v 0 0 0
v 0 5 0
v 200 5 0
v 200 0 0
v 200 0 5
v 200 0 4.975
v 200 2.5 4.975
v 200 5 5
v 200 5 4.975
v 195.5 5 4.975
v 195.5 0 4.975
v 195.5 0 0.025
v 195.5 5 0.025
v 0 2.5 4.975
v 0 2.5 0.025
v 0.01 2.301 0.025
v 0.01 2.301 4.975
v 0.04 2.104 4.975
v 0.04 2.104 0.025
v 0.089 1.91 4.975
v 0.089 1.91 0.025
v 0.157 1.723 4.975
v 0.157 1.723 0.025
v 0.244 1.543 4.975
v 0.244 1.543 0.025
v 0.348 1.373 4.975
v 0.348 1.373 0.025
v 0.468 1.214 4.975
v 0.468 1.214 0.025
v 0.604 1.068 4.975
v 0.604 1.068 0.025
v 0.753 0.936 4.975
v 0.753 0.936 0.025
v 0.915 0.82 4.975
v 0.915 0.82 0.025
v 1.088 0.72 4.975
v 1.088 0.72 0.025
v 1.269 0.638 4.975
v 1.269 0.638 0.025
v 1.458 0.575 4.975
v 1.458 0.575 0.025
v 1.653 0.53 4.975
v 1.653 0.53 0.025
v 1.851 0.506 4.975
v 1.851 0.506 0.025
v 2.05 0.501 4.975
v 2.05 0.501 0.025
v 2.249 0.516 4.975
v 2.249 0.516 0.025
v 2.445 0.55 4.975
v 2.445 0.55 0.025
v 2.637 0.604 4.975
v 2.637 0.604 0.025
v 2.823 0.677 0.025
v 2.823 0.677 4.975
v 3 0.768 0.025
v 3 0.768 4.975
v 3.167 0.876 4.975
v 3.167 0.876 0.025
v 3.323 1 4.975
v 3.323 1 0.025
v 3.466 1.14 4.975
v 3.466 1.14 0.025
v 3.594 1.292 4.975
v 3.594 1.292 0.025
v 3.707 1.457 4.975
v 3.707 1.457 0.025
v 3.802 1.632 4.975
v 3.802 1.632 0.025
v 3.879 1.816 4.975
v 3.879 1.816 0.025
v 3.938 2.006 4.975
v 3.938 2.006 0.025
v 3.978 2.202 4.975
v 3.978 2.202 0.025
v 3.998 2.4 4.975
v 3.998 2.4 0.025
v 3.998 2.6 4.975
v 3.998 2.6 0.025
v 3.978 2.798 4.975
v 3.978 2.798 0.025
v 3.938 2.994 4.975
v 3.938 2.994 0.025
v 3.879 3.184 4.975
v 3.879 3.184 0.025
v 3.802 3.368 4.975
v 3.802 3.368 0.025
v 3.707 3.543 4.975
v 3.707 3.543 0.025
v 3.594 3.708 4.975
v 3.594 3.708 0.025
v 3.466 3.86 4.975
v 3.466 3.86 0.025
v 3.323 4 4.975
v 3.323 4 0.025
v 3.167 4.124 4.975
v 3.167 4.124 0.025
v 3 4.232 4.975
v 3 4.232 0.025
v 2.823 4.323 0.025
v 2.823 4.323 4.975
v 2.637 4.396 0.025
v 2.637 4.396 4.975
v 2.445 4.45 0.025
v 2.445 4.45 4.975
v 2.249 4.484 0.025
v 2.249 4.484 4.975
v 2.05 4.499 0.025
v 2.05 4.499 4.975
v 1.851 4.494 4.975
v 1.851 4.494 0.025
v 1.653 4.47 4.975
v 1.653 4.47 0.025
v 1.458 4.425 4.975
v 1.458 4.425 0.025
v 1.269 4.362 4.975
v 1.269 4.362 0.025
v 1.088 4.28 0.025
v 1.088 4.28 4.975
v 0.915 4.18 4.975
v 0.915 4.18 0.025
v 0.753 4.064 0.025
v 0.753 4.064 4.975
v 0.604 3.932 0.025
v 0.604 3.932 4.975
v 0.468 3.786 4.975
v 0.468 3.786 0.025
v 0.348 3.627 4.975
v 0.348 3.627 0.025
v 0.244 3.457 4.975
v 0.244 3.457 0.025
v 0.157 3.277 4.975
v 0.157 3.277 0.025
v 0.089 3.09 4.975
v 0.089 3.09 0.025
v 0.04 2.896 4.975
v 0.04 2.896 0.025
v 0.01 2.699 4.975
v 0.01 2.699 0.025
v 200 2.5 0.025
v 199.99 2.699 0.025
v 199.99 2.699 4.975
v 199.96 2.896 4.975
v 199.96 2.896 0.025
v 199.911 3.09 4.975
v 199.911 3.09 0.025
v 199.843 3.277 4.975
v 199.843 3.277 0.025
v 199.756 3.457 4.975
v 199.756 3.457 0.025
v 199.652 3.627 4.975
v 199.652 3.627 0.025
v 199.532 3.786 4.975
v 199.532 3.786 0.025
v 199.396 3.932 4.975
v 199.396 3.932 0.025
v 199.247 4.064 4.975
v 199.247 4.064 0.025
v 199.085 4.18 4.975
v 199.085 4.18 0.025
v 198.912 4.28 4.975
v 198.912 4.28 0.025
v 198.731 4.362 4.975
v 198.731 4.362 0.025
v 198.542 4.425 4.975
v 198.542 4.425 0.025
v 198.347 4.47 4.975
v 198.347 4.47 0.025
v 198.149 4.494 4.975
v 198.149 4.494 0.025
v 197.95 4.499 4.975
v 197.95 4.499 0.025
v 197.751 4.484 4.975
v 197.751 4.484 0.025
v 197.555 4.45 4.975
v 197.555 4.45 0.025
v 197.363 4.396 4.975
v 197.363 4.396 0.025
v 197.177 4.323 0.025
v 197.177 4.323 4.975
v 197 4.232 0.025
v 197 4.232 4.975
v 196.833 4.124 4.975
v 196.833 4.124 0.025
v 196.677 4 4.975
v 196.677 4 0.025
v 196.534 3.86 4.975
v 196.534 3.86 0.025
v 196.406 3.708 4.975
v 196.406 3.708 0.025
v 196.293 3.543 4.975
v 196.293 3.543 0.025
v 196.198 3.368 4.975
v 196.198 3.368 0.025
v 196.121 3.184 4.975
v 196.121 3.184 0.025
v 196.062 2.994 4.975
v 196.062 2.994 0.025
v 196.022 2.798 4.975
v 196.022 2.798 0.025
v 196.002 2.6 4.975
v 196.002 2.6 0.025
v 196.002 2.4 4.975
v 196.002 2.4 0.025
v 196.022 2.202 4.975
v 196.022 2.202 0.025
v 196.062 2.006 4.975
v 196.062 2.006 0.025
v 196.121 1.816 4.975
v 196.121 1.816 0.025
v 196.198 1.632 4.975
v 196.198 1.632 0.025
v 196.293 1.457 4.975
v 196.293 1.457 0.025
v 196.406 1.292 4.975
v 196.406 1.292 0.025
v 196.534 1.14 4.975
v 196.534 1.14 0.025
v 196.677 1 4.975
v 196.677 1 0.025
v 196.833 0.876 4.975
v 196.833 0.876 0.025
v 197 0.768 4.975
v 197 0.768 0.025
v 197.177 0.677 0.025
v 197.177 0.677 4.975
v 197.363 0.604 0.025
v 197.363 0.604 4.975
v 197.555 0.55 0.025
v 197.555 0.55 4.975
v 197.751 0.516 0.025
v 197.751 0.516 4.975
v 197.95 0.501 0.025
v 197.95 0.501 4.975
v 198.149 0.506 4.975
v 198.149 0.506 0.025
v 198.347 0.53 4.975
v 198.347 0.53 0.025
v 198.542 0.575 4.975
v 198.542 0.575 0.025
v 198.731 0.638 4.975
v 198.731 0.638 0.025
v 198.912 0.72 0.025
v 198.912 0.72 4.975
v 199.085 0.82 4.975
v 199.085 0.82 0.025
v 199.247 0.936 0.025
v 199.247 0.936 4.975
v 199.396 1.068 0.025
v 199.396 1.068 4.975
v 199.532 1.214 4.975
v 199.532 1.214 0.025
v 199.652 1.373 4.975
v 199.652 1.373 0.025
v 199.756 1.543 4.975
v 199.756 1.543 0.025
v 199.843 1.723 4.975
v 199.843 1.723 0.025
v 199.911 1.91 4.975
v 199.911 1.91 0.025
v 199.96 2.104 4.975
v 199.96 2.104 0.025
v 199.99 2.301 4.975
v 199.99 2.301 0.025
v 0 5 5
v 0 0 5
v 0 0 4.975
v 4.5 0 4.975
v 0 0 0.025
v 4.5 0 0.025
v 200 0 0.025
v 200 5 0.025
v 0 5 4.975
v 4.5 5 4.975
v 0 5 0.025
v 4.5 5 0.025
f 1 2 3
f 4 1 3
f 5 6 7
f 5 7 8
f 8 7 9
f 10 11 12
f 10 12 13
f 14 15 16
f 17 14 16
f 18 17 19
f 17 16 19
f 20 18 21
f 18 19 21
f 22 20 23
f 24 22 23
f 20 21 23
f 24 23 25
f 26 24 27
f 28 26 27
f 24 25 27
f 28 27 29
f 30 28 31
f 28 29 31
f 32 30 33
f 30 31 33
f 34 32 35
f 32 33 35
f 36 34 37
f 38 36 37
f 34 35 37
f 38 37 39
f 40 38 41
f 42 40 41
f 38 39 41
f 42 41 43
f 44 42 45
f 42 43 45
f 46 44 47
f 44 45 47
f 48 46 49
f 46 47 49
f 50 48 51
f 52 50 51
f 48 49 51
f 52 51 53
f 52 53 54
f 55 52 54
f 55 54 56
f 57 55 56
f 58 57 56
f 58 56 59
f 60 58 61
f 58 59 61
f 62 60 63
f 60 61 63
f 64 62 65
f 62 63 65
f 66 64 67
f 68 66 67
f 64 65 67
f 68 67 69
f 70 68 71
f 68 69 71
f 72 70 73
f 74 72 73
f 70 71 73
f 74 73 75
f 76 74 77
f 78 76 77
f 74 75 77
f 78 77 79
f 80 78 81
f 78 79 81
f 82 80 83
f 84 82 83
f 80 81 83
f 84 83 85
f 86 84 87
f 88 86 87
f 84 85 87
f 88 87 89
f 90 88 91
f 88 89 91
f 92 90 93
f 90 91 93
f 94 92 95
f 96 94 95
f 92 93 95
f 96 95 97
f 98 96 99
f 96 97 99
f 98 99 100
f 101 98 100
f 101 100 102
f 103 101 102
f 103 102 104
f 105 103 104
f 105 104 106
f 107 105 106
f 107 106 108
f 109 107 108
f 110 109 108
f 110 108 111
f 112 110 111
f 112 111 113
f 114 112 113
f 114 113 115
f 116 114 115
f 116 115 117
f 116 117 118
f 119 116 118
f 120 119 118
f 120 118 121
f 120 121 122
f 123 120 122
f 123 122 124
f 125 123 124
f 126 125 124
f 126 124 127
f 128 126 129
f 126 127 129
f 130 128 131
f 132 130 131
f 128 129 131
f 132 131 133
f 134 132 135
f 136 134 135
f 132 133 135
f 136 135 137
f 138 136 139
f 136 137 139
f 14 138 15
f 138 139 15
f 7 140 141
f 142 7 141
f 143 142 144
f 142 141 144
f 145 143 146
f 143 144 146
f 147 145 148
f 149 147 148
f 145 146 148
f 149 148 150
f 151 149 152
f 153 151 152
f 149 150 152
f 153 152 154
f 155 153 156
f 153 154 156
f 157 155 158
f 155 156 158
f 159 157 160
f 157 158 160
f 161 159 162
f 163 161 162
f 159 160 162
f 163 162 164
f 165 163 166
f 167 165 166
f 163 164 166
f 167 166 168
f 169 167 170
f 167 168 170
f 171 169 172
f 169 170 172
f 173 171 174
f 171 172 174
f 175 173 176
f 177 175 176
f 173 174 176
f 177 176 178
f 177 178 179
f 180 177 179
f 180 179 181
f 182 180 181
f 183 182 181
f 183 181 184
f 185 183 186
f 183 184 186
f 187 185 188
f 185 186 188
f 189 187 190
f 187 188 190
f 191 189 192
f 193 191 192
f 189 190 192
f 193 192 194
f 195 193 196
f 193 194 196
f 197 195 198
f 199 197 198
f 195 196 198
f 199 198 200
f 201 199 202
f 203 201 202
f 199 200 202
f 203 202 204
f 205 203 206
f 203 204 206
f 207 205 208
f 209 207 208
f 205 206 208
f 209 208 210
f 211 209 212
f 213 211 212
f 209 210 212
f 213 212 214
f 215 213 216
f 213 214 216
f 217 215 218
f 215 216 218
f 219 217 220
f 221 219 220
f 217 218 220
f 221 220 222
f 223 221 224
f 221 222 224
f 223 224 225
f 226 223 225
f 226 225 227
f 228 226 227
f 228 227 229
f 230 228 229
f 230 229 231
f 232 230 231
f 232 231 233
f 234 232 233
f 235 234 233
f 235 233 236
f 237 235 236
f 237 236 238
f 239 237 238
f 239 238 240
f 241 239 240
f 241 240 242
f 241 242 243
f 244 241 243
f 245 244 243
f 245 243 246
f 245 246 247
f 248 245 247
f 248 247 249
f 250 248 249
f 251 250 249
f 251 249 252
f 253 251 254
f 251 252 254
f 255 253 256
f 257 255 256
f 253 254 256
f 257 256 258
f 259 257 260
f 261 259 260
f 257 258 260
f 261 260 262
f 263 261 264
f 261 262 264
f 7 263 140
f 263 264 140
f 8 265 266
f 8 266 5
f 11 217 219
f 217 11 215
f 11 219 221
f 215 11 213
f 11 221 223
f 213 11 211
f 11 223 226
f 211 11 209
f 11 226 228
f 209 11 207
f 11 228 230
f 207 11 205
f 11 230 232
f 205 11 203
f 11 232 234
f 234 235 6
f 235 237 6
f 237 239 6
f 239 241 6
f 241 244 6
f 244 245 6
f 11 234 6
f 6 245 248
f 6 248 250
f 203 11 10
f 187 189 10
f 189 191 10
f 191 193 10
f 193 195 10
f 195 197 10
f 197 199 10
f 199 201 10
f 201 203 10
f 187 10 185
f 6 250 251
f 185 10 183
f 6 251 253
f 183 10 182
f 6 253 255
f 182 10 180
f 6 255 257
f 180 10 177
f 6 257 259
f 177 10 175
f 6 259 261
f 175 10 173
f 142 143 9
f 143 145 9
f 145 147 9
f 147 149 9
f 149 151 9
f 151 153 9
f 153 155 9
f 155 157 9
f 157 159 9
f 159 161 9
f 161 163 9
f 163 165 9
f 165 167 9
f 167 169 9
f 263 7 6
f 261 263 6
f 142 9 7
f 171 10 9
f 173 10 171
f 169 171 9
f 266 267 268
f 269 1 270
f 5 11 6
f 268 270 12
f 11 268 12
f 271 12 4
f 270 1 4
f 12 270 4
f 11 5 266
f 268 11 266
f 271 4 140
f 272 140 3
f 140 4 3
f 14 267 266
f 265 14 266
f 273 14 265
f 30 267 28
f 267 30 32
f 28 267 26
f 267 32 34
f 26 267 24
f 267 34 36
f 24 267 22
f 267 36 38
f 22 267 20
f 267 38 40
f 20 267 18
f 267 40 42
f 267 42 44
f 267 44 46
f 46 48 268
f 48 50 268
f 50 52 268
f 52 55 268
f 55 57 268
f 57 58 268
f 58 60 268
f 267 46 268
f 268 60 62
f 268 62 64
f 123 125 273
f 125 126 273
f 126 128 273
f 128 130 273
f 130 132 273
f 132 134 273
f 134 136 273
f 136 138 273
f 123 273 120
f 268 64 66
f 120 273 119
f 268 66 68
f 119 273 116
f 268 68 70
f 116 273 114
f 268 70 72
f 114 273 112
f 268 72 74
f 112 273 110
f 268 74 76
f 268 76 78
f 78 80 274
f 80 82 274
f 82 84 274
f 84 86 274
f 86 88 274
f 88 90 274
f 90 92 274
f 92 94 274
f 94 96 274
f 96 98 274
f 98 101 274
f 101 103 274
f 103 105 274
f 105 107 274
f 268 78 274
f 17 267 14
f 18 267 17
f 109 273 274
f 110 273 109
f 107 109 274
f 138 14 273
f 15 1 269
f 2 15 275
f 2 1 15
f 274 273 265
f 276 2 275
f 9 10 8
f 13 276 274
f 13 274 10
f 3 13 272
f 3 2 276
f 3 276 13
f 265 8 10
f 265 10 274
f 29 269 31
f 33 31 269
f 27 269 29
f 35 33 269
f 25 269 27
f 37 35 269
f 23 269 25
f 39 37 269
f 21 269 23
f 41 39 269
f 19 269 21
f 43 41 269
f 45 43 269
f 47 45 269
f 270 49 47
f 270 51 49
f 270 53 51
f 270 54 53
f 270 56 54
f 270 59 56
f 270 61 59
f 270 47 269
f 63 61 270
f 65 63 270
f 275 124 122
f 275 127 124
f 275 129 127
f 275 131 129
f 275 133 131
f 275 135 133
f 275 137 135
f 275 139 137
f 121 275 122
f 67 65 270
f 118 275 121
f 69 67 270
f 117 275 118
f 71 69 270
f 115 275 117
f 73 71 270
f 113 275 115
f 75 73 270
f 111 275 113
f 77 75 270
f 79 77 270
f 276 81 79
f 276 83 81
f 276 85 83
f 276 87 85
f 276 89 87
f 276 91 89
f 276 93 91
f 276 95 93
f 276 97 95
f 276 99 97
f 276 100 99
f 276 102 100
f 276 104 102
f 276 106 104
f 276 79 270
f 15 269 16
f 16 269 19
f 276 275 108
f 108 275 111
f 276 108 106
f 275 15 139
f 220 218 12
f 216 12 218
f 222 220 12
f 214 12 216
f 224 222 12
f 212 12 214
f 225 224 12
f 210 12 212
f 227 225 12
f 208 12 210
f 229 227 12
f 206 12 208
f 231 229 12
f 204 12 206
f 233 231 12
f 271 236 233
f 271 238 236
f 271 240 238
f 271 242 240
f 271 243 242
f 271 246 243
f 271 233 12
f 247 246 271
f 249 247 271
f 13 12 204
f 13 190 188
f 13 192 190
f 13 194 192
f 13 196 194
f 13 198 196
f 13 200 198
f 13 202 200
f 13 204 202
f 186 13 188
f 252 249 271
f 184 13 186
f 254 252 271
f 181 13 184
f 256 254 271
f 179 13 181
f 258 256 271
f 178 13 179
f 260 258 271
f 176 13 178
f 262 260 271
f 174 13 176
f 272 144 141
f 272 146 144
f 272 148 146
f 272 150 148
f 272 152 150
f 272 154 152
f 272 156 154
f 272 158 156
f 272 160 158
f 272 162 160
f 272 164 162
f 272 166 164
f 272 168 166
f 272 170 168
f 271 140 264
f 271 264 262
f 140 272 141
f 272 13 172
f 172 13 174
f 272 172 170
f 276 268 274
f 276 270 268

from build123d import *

# Parameters (mm, degrees)
SKETCH1_W           = 200
SKETCH1_H           = 5
BOSS_EXTRUDE1_DEPTH = 5
SKETCH2_W           = 4.5
SKETCH2_H           = 5
CUT_EXTRUDE1_DEPTH  = 2.475
SKETCH3_R           = 2
BOSS_EXTRUDE3_DEPTH = 4.95
SKETCH4_R           = 2
BOSS_EXTRUDE4_DEPTH = 4.95


with BuildPart() as part:
    # Sketch1 → Boss-Extrude1 (new body)
    with BuildSketch(Plane.XY):
        with Locations((100, 2.5)):
            Rectangle(SKETCH1_W, SKETCH1_H)
    extrude(amount=BOSS_EXTRUDE1_DEPTH)

    # Sketch2 → Cut-Extrude1 (cut, symmetric)
    with BuildSketch(Plane.XY.offset(2.5)):
        with Locations((2.25, 2.5)):
            Rectangle(SKETCH2_W, SKETCH2_H)
        with Locations((197.75, 2.5)):
            Rectangle(SKETCH2_W, SKETCH2_H)
    extrude(amount=CUT_EXTRUDE1_DEPTH, both=True, mode=Mode.SUBTRACT)

    # Sketch3 → Boss-Extrude3 (add)
    with BuildSketch(Plane.XY.offset(0.025)):
        with Locations(Location((2, 2.5, 0), (0, 0, 180))):
            Circle(SKETCH3_R)
    extrude(amount=BOSS_EXTRUDE3_DEPTH)

    # Sketch4 → Boss-Extrude4 (add)
    with BuildSketch(Plane.XY.offset(0.025)):
        with Locations((198, 2.5)):
            Circle(SKETCH4_R)
    extrude(amount=BOSS_EXTRUDE4_DEPTH)


solid = part.part
